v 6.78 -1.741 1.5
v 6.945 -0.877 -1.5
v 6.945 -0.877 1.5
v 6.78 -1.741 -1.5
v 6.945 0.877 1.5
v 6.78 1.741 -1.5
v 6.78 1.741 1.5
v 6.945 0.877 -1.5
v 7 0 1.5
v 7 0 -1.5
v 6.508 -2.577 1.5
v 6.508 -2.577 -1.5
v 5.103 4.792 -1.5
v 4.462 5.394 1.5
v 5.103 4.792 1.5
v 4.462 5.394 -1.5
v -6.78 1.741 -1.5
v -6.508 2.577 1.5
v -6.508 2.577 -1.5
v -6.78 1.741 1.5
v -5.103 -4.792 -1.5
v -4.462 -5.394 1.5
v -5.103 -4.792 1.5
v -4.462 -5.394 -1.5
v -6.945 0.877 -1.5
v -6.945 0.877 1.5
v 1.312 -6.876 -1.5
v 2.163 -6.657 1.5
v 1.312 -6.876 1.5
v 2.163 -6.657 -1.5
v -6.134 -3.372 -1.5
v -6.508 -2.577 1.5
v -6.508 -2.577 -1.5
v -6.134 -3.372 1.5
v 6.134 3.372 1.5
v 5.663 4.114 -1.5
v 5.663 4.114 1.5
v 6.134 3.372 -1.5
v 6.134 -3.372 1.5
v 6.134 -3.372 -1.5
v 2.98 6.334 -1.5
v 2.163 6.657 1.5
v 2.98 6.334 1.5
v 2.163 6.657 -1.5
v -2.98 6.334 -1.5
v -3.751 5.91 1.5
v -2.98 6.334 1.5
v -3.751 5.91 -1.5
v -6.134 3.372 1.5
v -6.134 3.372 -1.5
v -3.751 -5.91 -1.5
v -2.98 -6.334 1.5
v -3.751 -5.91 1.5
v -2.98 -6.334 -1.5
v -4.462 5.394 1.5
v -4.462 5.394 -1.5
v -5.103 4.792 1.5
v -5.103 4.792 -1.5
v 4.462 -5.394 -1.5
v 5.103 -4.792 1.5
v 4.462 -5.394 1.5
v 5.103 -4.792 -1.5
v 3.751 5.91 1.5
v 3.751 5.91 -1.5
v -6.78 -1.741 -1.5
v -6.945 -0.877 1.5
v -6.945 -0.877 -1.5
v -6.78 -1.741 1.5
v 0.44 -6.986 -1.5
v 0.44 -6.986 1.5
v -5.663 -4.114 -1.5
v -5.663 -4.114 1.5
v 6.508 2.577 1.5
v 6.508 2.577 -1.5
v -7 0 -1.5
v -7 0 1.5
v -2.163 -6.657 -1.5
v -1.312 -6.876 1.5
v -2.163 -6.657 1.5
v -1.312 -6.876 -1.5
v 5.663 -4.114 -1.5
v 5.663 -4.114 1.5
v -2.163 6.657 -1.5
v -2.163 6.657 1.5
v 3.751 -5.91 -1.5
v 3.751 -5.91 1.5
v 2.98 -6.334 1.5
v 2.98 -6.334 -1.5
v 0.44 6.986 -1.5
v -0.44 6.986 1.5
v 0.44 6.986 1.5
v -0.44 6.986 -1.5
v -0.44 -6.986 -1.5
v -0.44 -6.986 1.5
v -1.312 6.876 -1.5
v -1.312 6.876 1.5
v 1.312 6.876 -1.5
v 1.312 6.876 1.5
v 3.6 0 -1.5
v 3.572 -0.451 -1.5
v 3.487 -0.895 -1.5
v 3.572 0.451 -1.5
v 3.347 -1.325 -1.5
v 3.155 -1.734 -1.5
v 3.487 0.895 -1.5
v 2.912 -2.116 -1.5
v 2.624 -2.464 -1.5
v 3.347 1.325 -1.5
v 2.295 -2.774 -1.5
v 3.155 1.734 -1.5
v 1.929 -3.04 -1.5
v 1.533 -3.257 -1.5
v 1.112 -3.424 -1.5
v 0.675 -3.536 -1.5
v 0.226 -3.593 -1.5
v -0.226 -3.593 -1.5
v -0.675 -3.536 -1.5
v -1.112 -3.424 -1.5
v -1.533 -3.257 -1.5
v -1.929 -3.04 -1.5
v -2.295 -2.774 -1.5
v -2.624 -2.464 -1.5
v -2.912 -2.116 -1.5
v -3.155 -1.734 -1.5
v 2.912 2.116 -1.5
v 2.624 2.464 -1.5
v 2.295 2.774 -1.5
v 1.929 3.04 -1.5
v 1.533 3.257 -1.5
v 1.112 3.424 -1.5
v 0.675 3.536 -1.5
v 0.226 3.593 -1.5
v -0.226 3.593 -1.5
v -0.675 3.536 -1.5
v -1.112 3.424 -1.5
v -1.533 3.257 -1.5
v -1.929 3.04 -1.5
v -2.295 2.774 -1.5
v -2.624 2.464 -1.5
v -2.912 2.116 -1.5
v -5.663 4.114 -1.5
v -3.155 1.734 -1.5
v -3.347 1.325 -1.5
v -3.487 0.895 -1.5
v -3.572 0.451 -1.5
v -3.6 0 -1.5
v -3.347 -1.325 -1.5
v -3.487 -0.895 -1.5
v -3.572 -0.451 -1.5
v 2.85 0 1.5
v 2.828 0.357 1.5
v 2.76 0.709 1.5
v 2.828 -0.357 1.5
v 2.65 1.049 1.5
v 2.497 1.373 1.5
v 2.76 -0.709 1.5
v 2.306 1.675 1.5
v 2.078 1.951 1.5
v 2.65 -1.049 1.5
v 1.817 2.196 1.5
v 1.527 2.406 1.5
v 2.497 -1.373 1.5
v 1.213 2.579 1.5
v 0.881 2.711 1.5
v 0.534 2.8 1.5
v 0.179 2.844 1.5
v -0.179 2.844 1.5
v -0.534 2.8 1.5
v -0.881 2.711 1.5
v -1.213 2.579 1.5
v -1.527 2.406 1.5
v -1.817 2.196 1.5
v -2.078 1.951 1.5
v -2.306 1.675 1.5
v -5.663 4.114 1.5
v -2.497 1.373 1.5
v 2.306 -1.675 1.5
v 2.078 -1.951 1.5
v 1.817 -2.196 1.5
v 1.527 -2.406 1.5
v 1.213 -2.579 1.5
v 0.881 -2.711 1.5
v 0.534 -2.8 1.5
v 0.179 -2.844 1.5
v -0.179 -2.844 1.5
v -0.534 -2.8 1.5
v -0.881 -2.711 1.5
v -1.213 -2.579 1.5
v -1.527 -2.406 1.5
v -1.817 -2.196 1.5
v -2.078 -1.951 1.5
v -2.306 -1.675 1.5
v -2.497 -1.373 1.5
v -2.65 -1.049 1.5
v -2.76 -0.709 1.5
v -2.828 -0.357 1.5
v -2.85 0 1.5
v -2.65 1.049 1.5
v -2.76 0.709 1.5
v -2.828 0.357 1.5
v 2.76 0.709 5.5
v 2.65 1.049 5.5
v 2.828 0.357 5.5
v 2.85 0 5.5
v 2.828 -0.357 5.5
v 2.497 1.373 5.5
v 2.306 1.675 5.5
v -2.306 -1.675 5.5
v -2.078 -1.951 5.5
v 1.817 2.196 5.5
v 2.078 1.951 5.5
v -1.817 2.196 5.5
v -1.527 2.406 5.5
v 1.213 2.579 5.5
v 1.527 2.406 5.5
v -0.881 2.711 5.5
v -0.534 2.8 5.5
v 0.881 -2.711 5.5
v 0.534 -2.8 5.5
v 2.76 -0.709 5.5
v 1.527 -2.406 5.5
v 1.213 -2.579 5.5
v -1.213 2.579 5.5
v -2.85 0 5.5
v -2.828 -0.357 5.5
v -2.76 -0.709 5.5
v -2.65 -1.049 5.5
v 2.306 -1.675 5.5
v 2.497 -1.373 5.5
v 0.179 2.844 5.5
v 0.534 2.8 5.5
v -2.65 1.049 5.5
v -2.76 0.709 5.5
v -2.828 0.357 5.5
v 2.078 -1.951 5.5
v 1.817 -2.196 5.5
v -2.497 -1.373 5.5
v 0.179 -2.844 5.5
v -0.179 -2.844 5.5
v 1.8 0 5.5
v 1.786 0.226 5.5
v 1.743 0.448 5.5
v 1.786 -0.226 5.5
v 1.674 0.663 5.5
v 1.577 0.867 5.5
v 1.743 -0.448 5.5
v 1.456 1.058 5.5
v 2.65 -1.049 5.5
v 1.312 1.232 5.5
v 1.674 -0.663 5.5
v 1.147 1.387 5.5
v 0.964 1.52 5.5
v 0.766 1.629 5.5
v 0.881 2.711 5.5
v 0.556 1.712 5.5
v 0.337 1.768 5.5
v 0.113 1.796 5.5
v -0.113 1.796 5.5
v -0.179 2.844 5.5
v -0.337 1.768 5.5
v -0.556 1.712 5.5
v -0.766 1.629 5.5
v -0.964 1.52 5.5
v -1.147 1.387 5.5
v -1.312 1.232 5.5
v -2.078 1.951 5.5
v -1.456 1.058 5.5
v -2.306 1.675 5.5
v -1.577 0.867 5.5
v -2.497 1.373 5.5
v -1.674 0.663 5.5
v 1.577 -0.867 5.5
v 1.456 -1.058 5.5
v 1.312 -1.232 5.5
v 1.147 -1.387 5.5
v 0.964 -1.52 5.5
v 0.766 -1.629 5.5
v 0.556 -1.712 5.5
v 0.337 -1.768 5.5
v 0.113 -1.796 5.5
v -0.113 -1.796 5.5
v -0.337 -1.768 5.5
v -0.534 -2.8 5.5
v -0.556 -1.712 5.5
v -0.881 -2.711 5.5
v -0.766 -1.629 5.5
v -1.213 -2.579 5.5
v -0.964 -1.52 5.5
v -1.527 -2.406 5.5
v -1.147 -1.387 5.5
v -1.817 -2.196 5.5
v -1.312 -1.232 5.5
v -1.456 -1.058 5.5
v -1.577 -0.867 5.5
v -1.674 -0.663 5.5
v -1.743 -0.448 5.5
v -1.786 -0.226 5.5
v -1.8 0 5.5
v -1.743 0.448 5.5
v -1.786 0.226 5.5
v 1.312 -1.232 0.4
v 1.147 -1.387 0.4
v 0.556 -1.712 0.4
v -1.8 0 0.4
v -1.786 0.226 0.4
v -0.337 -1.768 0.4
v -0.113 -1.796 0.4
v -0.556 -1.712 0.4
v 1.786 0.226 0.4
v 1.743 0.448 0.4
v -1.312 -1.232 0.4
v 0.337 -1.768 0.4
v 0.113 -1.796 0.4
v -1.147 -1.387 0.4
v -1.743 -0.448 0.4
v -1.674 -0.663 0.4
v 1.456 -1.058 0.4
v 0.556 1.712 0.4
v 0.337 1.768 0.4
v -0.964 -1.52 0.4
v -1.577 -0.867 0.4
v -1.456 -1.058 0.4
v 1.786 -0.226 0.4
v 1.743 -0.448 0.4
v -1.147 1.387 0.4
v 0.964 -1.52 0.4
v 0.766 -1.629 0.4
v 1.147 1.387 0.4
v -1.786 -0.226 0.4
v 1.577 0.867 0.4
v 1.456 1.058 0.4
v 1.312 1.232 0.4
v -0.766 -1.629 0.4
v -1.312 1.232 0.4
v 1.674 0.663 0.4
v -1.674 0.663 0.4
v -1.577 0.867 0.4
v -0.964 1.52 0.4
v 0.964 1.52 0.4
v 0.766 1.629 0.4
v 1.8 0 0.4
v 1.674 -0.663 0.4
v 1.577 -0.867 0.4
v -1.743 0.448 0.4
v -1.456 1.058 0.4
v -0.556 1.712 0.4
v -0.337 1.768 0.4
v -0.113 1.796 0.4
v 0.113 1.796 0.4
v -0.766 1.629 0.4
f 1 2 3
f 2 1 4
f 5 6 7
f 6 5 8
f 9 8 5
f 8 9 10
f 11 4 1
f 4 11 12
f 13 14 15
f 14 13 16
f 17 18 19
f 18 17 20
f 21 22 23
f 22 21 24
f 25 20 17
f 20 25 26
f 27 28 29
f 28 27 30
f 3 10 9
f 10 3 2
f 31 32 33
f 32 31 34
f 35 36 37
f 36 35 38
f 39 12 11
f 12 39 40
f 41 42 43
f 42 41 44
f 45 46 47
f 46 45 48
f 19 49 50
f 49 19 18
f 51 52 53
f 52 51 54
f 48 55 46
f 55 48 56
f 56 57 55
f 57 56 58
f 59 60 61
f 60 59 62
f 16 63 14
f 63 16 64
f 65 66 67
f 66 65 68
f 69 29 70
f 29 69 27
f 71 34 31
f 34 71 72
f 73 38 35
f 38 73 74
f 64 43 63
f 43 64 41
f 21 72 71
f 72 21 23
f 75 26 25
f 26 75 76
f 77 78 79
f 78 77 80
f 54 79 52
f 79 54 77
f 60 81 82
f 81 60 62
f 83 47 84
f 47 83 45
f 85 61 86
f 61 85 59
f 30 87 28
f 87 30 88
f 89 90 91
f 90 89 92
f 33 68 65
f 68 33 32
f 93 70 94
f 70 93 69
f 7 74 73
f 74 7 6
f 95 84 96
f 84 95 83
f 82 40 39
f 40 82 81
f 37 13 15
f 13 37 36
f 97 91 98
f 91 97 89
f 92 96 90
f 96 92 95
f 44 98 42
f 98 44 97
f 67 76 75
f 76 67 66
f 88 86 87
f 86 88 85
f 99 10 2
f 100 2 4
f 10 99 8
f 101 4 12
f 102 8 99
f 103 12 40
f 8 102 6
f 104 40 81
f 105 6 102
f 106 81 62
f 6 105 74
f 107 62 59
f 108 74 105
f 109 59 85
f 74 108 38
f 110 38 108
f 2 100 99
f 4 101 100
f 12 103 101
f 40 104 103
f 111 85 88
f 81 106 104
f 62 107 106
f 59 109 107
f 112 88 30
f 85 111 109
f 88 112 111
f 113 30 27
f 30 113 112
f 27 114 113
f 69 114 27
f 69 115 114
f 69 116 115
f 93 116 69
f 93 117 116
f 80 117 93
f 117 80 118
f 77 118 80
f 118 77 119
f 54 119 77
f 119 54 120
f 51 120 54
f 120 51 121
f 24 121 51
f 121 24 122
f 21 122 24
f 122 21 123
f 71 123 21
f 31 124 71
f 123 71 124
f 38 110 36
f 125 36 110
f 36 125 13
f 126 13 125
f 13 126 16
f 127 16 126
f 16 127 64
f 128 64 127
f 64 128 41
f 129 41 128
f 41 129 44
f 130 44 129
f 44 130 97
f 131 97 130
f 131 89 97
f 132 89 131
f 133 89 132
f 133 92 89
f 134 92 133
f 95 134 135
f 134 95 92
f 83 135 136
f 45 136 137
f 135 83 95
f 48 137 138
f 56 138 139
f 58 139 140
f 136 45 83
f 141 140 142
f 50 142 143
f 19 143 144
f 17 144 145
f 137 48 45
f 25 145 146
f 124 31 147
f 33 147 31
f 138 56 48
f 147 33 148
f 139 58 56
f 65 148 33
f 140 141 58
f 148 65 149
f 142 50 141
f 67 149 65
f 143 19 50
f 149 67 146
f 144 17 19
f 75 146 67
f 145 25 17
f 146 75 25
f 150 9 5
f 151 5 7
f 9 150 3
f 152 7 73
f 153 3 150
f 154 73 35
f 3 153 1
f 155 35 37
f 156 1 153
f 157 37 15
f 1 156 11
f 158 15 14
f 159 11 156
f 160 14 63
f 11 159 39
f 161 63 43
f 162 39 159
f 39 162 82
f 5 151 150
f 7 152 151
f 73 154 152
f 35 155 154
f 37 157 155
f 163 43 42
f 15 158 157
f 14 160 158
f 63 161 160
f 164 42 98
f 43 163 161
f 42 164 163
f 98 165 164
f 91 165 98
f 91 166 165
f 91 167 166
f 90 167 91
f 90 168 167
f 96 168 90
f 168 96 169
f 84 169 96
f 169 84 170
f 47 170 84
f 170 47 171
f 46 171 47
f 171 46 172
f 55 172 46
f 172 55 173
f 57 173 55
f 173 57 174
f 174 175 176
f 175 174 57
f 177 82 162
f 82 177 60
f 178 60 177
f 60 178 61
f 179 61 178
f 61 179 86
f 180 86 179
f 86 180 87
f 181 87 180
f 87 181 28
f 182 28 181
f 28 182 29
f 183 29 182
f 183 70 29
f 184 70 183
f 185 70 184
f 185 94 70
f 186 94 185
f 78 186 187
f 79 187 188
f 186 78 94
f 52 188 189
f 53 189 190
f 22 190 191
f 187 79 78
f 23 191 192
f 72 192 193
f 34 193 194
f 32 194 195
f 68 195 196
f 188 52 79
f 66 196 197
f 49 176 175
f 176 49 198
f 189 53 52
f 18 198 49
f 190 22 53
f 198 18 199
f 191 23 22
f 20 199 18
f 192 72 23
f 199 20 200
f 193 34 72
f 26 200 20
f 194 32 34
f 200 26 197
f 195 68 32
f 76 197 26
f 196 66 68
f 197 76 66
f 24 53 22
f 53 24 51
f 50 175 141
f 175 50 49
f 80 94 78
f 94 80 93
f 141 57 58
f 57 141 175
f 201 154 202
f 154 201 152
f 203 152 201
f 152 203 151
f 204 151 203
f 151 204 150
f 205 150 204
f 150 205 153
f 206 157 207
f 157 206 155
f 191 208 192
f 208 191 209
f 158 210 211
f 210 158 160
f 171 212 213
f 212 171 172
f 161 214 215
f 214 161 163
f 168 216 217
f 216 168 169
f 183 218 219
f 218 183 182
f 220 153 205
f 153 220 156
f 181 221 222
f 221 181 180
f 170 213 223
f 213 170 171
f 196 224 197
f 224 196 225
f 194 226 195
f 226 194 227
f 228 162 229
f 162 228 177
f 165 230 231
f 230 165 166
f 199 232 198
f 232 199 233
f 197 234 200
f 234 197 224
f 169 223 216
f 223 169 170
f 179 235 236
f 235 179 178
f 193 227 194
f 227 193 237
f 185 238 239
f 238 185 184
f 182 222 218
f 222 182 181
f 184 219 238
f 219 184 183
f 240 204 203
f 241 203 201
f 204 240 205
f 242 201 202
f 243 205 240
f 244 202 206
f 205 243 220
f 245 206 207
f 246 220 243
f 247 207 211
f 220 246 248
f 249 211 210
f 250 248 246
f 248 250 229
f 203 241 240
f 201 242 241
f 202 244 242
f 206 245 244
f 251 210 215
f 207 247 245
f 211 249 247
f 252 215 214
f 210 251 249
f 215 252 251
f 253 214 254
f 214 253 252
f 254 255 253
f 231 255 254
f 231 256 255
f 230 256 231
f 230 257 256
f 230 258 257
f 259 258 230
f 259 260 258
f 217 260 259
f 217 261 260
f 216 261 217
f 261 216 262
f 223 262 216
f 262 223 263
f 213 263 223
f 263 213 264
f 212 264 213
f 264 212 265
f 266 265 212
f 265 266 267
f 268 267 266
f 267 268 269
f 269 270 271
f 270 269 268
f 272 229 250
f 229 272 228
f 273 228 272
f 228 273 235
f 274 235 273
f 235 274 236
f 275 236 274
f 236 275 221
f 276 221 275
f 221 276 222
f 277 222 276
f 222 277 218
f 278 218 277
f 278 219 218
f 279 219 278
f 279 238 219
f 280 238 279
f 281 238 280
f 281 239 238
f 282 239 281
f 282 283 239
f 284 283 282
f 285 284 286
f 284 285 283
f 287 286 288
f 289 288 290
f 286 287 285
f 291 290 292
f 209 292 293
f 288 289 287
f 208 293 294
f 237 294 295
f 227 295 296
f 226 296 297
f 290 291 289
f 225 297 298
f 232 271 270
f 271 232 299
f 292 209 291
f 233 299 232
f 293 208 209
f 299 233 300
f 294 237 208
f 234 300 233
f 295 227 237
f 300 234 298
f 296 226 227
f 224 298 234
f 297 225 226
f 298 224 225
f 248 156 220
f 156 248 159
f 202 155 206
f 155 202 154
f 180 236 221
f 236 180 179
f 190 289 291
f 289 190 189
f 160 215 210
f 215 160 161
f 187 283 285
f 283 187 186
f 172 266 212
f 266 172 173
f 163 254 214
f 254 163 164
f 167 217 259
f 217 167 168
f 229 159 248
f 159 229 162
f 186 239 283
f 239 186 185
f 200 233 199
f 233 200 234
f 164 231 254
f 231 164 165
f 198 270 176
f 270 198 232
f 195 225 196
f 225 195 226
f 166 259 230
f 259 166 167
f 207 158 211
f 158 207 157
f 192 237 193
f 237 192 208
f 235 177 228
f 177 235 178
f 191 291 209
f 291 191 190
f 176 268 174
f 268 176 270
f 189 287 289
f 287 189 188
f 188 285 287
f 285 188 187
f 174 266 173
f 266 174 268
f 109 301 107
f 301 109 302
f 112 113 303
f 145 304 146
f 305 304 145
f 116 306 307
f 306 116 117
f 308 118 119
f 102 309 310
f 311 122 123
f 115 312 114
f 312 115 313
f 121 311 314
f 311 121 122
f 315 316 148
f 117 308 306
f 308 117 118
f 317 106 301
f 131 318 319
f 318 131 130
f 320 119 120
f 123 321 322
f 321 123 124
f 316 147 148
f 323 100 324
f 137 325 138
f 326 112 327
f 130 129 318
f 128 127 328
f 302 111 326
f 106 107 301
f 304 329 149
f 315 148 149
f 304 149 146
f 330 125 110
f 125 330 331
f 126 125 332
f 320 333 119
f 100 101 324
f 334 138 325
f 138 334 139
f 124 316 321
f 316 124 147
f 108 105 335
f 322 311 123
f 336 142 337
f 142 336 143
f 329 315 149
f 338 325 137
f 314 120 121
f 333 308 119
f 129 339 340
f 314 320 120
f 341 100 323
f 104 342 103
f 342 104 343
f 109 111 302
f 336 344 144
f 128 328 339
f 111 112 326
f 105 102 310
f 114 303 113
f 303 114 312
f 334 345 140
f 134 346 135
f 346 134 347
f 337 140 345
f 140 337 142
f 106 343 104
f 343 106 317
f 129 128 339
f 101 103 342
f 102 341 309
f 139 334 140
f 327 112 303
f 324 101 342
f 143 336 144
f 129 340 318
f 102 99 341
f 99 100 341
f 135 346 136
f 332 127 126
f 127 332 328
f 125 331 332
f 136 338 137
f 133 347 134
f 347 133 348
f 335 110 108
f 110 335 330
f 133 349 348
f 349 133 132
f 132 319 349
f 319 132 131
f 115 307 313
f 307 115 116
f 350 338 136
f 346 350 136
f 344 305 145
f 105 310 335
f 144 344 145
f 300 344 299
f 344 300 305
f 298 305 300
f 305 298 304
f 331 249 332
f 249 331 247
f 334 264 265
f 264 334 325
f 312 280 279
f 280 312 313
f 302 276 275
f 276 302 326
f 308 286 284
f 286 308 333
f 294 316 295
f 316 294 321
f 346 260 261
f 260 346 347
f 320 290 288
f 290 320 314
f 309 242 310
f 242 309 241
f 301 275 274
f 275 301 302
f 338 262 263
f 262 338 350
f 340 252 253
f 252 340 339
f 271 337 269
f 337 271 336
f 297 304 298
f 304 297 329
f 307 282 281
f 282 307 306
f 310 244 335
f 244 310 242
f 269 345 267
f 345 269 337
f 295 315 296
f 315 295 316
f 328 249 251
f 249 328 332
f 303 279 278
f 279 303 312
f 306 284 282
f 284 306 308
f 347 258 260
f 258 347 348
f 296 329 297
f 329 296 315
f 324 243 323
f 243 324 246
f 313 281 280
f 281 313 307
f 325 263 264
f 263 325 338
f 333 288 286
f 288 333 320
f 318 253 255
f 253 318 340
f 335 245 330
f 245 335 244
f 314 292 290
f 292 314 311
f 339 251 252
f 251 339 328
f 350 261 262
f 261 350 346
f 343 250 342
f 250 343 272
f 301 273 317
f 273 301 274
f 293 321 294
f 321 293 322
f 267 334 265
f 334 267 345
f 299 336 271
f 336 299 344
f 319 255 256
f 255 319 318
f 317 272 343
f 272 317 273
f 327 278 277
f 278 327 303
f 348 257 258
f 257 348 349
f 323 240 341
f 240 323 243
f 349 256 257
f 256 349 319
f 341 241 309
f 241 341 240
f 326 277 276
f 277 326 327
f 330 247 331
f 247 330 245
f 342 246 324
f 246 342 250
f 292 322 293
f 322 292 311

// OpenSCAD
$fn = 50;


difference() {
	union() {
		translate(v = [0, 0, -1.5000000000]) {
			cylinder(h = 3, r = 7.0000000000);
		}
		translate(v = [0, 0, -1.5000000000]) {
			cylinder(h = 7, r = 2.8500000000);
		}
	}
	union() {
		translate(v = [0, 0, -1.5000000000]) {
			rotate(a = [0, 180, 0]) {
				difference() {
					union() {
						translate(v = [0, 0, -7.0000000000]) {
							cylinder(h = 7, r = 1.5000000000);
						}
						translate(v = [0, 0, -1.9000000000]) {
							cylinder(h = 1.9000000000, r1 = 1.8000000000, r2 = 3.6000000000);
						}
						translate(v = [0, 0, -7.0000000000]) {
							cylinder(h = 7, r = 1.8000000000);
						}
						translate(v = [0, 0, -7.0000000000]) {
							cylinder(h = 7, r = 1.5000000000);
						}
					}
					union();
				}
			}
		}
		translate(v = [0, 0, -100.0000000000]) {
			cylinder(h = 200, r = 1.8000000000);
		}
	}
}
